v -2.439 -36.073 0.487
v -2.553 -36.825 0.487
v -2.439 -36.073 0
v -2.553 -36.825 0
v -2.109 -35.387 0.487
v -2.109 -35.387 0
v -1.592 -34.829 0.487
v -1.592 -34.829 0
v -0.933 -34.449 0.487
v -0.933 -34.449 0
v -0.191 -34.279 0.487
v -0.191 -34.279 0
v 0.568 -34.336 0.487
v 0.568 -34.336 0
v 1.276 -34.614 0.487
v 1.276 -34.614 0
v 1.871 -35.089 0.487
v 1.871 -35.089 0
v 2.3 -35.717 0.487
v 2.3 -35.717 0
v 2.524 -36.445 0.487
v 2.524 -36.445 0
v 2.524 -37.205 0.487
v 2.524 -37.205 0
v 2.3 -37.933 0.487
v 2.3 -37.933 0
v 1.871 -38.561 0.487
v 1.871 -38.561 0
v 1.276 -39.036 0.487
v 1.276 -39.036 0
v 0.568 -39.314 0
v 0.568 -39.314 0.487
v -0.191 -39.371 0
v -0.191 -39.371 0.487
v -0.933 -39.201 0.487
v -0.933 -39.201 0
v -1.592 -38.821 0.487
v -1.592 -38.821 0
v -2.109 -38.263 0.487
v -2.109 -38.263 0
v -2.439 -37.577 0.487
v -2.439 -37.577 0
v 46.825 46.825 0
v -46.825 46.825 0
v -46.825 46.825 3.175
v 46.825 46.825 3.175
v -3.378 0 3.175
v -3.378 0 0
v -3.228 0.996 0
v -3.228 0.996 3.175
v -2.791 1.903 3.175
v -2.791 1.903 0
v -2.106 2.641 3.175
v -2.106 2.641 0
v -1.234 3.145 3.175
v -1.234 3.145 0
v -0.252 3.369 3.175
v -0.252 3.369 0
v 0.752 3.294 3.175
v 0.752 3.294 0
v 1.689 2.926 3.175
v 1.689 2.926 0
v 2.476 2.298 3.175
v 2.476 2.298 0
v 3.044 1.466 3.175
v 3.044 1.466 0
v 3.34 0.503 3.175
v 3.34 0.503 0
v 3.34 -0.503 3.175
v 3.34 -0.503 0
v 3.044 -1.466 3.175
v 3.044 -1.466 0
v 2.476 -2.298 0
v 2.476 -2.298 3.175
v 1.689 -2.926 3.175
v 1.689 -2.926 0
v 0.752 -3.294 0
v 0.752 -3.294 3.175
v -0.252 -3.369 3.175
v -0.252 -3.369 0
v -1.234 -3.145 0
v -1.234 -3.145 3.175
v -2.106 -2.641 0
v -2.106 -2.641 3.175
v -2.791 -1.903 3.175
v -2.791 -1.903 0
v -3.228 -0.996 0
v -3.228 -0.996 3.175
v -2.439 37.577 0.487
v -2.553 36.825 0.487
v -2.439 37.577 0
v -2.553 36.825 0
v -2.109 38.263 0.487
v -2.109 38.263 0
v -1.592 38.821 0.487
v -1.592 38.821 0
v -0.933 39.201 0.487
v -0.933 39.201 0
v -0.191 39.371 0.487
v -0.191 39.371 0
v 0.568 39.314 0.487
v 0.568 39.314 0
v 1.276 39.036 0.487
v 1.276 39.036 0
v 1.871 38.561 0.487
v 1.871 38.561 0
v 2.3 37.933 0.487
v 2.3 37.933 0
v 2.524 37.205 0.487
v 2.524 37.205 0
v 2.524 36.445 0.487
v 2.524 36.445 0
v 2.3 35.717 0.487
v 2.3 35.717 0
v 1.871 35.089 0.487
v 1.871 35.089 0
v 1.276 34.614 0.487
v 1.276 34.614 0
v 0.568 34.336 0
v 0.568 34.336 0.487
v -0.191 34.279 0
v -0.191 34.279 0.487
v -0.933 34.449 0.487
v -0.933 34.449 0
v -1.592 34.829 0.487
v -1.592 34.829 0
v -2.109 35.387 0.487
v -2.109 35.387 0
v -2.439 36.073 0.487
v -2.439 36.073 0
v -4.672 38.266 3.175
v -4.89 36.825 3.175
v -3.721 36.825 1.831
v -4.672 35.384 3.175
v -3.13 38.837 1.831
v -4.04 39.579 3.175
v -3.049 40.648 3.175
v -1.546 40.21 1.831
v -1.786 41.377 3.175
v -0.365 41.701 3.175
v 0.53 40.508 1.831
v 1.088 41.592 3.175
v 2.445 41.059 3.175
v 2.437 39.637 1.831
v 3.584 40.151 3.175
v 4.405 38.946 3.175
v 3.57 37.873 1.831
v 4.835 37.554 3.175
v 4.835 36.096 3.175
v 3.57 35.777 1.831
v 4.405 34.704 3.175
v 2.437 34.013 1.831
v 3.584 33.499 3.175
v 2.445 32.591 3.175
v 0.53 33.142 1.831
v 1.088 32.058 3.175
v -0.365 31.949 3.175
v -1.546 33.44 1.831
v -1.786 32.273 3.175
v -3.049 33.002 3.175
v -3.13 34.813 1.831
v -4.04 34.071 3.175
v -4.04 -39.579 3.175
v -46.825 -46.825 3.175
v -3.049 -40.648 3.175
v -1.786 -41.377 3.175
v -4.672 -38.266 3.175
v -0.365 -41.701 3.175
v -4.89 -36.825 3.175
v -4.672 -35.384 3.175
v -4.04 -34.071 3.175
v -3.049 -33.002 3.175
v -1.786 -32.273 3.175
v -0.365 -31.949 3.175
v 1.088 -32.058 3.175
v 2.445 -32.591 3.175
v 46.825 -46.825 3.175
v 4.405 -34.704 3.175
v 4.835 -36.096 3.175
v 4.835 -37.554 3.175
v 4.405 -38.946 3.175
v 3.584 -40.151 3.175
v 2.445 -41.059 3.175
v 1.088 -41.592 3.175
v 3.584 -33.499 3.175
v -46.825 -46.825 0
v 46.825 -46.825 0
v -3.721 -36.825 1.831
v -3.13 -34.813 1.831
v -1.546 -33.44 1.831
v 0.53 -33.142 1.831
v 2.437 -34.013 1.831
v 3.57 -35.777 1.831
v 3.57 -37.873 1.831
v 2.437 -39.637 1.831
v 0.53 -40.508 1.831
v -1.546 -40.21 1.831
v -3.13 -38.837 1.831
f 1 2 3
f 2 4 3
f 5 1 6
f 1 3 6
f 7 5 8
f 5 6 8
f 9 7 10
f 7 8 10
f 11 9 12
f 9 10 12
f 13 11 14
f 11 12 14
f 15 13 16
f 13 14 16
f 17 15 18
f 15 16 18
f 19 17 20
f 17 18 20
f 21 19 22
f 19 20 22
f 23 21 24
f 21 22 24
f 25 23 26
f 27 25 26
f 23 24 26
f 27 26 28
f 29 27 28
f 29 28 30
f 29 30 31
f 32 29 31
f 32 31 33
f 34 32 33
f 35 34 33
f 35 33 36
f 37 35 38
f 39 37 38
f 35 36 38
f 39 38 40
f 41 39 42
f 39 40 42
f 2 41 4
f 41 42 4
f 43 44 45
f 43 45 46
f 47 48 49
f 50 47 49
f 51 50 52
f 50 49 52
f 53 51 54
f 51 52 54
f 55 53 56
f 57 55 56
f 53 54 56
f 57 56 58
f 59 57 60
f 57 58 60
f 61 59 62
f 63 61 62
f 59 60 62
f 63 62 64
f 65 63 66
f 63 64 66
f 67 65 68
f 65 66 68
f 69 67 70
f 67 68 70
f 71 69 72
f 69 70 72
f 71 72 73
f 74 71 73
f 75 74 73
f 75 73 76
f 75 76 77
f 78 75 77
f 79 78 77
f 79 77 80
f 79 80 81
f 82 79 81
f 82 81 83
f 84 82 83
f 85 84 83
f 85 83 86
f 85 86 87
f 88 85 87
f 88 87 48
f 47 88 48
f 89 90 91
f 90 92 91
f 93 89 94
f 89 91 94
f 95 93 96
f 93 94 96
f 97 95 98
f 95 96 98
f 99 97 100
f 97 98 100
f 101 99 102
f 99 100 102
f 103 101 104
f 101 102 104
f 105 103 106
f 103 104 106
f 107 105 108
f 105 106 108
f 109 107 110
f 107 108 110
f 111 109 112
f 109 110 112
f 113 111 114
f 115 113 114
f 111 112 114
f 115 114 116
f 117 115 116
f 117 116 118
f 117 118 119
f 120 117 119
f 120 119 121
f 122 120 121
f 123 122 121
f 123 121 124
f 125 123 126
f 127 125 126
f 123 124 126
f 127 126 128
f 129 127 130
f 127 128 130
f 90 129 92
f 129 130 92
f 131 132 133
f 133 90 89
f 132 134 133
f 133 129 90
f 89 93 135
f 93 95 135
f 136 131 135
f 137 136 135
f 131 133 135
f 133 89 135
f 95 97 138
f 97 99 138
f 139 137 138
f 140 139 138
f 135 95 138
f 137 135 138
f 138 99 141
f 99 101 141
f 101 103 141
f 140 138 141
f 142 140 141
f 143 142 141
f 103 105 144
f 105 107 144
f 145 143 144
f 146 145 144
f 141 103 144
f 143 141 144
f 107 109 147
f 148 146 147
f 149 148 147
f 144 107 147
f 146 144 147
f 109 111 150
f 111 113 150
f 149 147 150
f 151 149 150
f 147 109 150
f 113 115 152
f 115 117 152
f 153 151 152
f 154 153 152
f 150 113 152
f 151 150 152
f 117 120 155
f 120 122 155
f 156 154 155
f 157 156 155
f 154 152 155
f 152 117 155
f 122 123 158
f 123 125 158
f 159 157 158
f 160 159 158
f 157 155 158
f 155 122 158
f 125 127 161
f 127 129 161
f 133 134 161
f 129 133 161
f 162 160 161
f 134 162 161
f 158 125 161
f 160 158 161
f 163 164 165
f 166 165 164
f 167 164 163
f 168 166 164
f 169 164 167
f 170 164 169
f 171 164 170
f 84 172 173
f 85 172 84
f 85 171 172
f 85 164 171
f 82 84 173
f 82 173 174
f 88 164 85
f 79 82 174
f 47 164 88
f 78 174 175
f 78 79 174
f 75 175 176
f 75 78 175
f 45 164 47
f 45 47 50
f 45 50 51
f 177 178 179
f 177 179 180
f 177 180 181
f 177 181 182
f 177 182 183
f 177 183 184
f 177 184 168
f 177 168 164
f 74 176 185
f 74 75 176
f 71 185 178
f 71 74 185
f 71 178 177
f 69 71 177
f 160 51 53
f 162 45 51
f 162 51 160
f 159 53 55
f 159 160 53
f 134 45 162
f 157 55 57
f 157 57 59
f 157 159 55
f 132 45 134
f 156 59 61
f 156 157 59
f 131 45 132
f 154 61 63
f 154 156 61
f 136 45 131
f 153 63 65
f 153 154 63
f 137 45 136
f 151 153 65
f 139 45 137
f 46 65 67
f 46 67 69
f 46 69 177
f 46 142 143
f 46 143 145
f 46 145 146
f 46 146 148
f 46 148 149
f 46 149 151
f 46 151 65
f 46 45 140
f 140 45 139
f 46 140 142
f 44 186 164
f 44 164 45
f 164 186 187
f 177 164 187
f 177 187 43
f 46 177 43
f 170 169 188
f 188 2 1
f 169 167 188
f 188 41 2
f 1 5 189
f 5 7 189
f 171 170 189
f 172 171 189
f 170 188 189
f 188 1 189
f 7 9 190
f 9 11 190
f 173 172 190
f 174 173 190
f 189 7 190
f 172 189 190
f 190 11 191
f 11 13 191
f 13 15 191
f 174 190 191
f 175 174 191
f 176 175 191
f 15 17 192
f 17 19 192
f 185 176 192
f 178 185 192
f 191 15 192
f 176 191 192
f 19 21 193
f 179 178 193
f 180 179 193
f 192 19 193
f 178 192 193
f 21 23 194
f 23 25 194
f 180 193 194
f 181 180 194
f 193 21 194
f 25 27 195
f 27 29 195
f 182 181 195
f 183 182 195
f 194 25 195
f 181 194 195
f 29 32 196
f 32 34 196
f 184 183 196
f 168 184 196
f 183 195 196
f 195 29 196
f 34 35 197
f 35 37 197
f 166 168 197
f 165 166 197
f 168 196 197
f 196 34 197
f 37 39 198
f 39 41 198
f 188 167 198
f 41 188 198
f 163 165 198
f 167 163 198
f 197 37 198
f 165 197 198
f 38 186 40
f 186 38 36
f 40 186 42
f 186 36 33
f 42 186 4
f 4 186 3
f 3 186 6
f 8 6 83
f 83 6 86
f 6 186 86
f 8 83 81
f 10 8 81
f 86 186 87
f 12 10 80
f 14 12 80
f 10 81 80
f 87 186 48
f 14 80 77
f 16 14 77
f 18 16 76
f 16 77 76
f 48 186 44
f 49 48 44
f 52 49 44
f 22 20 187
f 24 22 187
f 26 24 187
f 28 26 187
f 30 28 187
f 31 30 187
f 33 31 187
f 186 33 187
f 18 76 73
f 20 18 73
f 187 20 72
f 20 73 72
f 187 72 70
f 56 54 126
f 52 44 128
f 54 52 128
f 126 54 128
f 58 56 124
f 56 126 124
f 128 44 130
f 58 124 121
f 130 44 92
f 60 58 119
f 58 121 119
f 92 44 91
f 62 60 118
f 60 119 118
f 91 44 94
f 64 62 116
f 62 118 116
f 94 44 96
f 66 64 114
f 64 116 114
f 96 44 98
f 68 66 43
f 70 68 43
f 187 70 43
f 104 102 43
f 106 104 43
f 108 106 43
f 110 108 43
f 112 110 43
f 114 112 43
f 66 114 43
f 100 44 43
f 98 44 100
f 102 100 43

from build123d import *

# Parameters (mm, degrees)
SKETCH1_W                                       = 93.649999898
SKETCH1_H                                       = 93.649999898
BOSS_EXTRUDE1_DEPTH                             = 3.175
F_1_4_CLEARANCE_HOLE1_D                         = 6.7564
F_1_4_CLEARANCE_HOLE1_DEPTH                     = 4.826
F_1_4_CLEARANCE_HOLE1_TIP                       = 2.029827343
CSK_FOR_10_FLAT_HEAD_MACHINE_SCREW1_D           = 5.1054
CSK_FOR_10_FLAT_HEAD_MACHINE_SCREW1_DEPTH       = 4.826
CSK_FOR_10_FLAT_HEAD_MACHINE_SCREW1_CSINK_D     = 9.779
CSK_FOR_10_FLAT_HEAD_MACHINE_SCREW1_CSINK_ANGLE = 82
CSK_FOR_10_FLAT_HEAD_MACHINE_SCREW1_TIP         = 1.533816902


with BuildPart() as part:
    # Sketch1 → Boss-Extrude1 (new body)
    with BuildSketch(Plane.XY):
        Rectangle(SKETCH1_W, SKETCH1_H)
    extrude(amount=BOSS_EXTRUDE1_DEPTH)

    # 1/4 Clearance Hole1
    with Locations(Plane.XY.offset(3.175)):
        with Locations((0, 0)):
            Hole(F_1_4_CLEARANCE_HOLE1_D / 2, depth=F_1_4_CLEARANCE_HOLE1_DEPTH)
            with Locations((0, 0, -(F_1_4_CLEARANCE_HOLE1_DEPTH + F_1_4_CLEARANCE_HOLE1_TIP / 2))):  # 118° drill point
                Cone(0, F_1_4_CLEARANCE_HOLE1_D / 2, F_1_4_CLEARANCE_HOLE1_TIP, mode=Mode.SUBTRACT)

    # CSK for #10 Flat Head Machine Screw1
    with Locations(Plane.XY.offset(3.175)):
        with Locations((0, 36.824999949), (0, -36.824999949)):
            CounterSinkHole(CSK_FOR_10_FLAT_HEAD_MACHINE_SCREW1_D / 2, CSK_FOR_10_FLAT_HEAD_MACHINE_SCREW1_CSINK_D / 2, depth=CSK_FOR_10_FLAT_HEAD_MACHINE_SCREW1_DEPTH, counter_sink_angle=CSK_FOR_10_FLAT_HEAD_MACHINE_SCREW1_CSINK_ANGLE)
            with Locations((0, 0, -(CSK_FOR_10_FLAT_HEAD_MACHINE_SCREW1_DEPTH + CSK_FOR_10_FLAT_HEAD_MACHINE_SCREW1_TIP / 2))):  # 118° drill point
                Cone(0, CSK_FOR_10_FLAT_HEAD_MACHINE_SCREW1_D / 2, CSK_FOR_10_FLAT_HEAD_MACHINE_SCREW1_TIP, mode=Mode.SUBTRACT)


solid = part.part
